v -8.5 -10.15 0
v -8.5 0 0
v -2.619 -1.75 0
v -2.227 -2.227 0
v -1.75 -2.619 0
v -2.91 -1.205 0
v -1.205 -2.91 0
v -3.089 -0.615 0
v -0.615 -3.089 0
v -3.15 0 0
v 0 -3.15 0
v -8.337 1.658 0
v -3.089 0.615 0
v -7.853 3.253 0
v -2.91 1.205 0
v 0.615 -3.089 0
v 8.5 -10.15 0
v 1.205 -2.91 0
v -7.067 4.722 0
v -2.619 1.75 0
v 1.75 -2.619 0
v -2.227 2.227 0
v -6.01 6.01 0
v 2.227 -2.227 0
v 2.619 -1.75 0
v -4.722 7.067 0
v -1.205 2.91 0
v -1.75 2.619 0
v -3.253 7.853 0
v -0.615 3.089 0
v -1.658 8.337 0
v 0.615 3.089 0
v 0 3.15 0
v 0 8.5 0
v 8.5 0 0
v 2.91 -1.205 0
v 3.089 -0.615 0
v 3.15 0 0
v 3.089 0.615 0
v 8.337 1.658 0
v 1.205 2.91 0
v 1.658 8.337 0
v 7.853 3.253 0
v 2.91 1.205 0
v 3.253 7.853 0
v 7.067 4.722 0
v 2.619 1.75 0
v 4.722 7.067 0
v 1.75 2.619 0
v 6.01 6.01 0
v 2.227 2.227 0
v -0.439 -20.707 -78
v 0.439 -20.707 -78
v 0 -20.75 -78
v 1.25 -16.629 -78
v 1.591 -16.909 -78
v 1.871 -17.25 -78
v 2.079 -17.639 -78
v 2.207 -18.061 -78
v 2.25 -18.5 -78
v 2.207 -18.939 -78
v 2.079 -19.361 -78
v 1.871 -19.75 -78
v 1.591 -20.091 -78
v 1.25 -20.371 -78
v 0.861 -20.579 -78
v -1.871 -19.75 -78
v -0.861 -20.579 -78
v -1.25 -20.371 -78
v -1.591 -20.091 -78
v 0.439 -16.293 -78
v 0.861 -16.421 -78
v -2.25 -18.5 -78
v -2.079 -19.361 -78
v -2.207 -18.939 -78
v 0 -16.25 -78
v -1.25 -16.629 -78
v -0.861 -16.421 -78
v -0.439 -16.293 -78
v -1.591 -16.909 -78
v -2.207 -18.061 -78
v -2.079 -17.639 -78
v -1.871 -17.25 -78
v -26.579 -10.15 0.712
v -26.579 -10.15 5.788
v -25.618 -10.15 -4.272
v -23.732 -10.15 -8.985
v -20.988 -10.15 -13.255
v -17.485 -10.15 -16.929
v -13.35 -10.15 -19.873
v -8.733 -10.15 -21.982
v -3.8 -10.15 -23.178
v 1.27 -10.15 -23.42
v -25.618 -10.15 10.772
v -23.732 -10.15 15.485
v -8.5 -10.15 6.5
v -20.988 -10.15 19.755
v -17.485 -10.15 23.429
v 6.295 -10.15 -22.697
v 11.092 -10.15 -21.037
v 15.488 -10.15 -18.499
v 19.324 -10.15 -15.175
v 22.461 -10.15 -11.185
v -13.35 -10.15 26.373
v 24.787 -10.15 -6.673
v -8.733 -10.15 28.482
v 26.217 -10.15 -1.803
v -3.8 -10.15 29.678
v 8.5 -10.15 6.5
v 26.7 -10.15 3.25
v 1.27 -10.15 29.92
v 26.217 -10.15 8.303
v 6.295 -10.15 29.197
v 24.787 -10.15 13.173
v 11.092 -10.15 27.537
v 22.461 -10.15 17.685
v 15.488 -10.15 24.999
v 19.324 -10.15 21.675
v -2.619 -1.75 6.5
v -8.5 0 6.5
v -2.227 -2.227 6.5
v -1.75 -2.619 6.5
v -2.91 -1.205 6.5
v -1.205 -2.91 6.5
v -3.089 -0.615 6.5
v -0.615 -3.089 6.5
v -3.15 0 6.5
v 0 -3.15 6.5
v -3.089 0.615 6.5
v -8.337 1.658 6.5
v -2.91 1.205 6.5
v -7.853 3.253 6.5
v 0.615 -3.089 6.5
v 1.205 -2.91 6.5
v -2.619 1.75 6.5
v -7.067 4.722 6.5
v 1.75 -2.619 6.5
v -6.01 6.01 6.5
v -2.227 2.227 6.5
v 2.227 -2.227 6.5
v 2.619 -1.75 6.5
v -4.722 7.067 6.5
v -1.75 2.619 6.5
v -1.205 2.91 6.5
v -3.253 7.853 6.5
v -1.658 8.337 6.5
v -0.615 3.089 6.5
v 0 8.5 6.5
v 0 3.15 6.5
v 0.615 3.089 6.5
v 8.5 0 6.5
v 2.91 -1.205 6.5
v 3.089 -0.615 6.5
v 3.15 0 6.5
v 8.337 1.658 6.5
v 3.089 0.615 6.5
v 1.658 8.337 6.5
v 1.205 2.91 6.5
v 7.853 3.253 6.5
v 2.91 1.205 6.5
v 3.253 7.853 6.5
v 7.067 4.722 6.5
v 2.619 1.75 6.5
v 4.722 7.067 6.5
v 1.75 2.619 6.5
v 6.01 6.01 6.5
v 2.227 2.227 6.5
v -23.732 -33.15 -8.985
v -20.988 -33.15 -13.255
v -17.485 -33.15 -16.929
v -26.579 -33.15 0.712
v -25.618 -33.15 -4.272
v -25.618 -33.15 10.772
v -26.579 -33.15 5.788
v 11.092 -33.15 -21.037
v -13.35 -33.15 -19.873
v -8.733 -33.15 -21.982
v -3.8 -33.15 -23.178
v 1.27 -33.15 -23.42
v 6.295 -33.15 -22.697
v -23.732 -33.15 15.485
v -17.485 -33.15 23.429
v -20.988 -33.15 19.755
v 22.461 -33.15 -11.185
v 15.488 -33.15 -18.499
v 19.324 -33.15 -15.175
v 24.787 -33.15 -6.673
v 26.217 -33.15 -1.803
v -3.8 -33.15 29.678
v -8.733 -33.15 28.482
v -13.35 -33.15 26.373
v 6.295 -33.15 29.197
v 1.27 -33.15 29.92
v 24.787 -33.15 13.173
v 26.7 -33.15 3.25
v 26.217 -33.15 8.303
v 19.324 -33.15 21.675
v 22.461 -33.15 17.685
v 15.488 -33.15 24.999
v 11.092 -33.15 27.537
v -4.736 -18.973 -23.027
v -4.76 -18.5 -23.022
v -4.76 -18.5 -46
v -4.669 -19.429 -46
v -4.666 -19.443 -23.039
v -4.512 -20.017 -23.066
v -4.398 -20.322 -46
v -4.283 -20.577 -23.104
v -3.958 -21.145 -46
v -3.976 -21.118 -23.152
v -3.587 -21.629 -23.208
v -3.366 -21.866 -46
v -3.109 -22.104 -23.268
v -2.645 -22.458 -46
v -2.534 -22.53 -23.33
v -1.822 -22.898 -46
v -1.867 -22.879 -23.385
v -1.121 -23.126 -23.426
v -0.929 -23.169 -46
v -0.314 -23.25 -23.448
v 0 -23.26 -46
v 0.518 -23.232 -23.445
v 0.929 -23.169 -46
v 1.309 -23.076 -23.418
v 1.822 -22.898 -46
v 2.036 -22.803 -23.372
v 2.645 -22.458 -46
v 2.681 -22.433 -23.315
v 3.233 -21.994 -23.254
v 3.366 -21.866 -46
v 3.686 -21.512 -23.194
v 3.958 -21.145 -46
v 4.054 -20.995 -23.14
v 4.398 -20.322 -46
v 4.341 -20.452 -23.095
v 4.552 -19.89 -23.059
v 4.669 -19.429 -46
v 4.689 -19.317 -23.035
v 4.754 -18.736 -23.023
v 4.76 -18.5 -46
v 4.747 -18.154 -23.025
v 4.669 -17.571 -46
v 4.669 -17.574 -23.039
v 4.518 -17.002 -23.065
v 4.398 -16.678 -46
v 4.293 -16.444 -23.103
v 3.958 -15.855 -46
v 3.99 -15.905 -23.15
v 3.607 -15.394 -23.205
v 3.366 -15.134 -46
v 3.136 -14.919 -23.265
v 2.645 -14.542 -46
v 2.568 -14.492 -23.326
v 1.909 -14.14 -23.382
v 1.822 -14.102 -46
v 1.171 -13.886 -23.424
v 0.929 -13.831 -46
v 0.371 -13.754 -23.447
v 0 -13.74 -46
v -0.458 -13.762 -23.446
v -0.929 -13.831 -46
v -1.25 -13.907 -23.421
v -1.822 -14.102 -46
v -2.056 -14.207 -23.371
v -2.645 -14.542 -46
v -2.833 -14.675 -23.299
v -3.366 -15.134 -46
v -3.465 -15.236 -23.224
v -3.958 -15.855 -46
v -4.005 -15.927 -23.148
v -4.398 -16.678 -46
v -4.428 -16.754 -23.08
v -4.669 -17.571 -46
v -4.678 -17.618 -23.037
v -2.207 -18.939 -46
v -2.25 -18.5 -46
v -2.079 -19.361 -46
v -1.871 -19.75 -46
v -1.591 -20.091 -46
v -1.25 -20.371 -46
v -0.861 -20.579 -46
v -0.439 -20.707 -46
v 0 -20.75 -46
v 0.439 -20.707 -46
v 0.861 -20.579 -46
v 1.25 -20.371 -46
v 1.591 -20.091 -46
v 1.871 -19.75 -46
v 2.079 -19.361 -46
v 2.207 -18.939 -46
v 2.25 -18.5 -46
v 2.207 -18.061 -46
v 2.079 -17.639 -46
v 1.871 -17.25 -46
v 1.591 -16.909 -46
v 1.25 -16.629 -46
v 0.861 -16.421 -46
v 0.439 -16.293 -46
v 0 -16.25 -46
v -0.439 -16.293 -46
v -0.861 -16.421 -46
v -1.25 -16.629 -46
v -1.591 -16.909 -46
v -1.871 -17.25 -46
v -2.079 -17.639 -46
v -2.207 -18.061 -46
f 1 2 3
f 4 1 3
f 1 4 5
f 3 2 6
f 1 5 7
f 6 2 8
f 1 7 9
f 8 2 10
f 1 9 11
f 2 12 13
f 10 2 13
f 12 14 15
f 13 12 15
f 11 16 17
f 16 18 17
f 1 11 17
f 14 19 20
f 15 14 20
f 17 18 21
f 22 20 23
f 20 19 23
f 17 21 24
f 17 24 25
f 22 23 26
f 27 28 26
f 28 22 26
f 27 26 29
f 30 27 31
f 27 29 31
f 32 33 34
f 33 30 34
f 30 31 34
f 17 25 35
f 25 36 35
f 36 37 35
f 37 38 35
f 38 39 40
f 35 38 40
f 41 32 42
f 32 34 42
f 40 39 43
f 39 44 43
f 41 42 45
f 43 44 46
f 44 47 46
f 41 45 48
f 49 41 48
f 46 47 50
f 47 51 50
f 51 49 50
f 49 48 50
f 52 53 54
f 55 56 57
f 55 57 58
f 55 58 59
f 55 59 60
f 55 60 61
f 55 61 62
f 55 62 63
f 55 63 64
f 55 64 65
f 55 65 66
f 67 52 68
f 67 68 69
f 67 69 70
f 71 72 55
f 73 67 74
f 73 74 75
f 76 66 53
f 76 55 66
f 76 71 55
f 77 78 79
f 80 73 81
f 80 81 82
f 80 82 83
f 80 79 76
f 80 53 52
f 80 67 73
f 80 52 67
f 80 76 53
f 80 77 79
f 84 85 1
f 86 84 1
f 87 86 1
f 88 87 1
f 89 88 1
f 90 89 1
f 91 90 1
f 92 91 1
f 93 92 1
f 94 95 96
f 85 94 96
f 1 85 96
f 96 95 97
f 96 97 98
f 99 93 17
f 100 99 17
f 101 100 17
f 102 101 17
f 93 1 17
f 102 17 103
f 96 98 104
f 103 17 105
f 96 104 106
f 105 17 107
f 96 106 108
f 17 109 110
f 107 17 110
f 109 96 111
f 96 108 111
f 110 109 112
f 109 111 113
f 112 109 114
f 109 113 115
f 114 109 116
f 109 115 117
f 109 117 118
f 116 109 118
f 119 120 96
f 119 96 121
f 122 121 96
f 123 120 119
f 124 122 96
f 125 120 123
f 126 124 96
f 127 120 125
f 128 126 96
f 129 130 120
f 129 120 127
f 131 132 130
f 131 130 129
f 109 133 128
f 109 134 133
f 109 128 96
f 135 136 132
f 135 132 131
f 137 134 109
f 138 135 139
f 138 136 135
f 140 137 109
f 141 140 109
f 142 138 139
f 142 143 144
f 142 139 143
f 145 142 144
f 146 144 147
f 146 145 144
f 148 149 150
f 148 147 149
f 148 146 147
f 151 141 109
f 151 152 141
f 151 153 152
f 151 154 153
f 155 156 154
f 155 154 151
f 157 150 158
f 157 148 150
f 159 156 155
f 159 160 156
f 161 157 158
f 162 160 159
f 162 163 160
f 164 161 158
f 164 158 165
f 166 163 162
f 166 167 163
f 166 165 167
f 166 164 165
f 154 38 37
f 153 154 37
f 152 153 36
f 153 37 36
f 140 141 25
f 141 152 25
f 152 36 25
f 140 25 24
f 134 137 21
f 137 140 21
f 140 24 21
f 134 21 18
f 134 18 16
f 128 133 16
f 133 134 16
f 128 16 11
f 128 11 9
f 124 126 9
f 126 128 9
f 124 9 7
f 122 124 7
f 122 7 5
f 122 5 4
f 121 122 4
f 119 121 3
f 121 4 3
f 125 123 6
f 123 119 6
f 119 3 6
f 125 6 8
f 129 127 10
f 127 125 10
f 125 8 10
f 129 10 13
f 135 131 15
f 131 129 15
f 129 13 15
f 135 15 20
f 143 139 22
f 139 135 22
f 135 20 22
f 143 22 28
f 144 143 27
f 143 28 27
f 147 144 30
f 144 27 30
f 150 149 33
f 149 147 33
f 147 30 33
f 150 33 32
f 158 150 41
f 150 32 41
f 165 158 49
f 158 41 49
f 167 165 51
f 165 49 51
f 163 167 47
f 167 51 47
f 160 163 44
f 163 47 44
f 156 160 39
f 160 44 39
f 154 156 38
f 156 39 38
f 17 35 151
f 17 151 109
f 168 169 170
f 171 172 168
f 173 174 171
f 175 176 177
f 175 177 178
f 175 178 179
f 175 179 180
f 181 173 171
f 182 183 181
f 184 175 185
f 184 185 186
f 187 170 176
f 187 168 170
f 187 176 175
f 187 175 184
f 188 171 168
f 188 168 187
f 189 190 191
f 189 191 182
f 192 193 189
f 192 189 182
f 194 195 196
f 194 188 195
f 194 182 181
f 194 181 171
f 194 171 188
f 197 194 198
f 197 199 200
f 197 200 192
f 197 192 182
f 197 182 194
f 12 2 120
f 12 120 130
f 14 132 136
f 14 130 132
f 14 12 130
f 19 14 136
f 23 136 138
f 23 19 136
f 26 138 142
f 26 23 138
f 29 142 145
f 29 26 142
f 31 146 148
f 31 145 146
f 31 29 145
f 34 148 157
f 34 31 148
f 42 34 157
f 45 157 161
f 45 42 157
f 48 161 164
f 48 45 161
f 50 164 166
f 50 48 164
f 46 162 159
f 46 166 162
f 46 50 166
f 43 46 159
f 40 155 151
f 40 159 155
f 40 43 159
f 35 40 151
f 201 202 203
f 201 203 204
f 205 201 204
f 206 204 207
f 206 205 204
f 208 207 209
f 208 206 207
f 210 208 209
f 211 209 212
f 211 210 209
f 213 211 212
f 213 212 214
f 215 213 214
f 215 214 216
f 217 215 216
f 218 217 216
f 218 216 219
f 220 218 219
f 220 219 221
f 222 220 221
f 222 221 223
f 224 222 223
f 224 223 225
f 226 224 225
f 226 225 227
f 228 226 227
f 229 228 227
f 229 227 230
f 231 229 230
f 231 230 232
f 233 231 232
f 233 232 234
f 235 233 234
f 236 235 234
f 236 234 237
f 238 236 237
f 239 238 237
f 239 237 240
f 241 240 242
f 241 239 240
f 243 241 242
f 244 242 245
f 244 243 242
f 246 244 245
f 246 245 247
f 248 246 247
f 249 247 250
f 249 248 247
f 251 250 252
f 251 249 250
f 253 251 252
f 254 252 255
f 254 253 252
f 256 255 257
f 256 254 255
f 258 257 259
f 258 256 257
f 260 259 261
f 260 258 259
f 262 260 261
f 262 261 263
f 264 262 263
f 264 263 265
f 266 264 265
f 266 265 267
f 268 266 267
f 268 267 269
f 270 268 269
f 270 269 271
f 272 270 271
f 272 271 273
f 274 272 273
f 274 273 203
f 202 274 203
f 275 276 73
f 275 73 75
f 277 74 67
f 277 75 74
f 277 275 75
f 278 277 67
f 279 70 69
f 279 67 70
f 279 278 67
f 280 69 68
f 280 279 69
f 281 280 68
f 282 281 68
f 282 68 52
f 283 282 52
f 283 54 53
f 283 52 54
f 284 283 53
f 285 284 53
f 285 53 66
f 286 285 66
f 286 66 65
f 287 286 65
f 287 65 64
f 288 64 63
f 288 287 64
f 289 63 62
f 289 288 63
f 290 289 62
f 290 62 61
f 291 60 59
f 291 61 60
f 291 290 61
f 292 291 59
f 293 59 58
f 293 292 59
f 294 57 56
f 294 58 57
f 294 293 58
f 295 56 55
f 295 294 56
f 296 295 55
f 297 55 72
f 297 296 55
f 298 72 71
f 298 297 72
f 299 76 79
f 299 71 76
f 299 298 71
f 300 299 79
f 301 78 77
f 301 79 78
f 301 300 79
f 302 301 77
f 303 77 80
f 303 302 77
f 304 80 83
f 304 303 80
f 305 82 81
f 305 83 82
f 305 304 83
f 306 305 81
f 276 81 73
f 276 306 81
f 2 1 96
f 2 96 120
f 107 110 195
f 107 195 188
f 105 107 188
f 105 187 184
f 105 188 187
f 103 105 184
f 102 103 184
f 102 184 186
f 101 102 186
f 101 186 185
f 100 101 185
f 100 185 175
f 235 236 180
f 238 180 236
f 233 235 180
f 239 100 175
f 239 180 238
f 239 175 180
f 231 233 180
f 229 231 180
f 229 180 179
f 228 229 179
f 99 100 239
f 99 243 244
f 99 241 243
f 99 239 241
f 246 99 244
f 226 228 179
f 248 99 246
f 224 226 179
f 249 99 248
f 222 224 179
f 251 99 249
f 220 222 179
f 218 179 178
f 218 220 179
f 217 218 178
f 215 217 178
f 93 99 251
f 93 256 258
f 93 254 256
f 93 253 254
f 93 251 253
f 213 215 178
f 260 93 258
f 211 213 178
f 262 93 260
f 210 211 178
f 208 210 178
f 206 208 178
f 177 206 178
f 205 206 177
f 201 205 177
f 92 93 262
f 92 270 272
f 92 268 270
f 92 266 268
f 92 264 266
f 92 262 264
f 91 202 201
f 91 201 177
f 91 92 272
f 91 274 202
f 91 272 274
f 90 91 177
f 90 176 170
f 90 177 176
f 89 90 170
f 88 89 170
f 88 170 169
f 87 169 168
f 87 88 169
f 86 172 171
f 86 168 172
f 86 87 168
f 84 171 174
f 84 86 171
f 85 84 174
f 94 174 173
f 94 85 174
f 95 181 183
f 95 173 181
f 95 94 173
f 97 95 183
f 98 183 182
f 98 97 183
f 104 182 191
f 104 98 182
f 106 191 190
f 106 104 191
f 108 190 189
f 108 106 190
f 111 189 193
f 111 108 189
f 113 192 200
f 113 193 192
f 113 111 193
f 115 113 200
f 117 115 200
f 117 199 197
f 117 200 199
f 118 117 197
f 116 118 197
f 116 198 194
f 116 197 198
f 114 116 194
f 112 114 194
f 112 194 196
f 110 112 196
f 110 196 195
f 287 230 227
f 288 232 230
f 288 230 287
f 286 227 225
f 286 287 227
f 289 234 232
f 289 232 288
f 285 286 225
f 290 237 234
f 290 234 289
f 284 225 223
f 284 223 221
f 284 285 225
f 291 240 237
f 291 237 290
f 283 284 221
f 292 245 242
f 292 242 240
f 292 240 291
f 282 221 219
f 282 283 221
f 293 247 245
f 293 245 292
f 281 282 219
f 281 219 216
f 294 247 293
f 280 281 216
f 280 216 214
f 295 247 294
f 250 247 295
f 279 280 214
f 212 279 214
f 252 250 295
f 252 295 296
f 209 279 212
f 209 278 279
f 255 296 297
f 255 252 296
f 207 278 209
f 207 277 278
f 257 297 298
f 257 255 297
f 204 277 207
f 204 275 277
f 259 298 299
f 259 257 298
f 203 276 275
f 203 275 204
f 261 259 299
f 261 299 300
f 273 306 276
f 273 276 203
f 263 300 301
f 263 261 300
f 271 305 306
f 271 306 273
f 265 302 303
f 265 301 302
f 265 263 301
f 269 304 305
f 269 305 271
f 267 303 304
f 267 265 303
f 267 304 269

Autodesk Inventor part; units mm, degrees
ref_plane "XZ Plane" through (0, 0, 0) normal (0, 1, 0) x (-1, 0, 0)
ref_plane "XY Plane" through (0, 0, 0) normal (0, 0, 1) x (1, 0, 0)
sketch "Sketch2" plane through (0, 0, 0) normal (0, 0, 1) x (1, 0, 0)
  circle A0 centre (0, 0) radius 3.15
  line L0 (-8.5, -10.15) -> (-8.5, 0)
  line L1 (8.5, 0) -> (8.5, -10.15)
  line L2 (-8.5, -10.15) -> (8.5, -10.15)
  arc A1 (8.5, 0) -> (-8.5, 0) centre (0, 0) ccw
  line L3 (0, 8.5) -> (8.5, 8.5) construction
  dimension "d0" = 6.3
  dimension "d1" = 17
  dimension "d2" = 18.65
extrude "Extrusion1" add sketch "Sketch2" along normal blind 6.5
sketch "Sketch3" plane through (-8.5, -10.15, 0) normal (0, -1, 0) x (1, 0, 0)
  line L0 (0, 6.5) -> (17, 6.5) projected
  line L1 (0, 0) -> (0, 6.5) projected
  circle A0 centre (8.5, 3.25) radius 26.7
  point P0 (8.5, 0)
  point P1 (0, 3.25)
  point P2 (0, 3.25)
  point P3 (8.5, 6.5)
  dimension "d5" = 53.4
extrude "Extrusion2" add sketch "Sketch3" along normal blind 23
sketch "Sketch4" plane through (0, 0, 0) normal (0, 0, -1) x (-1, 0, 0)
  circle A0 centre (0, 0) radius 3.15 projected
  circle A1 centre (0, 0) radius 3.15 projected
  arc A2 (8.5, 0) -> (-8.5, 0) centre (0, 0) ccw projected
  line L0 (8.5, 0) -> (8.5, -10.15) projected
  line L1 (8.5, -10.15) -> (26.5015, -10.15) projected
  line L2 (26.5015, -10.15) -> (26.5015, -33.15) projected
  line L3 (26.5015, -33.15) -> (-26.5015, -33.15) projected
  line L4 (-26.5015, -33.15) -> (-26.5015, -10.15) projected
  line L5 (-26.5015, -10.15) -> (-8.5, -10.15) projected
  line L6 (-8.5, -10.15) -> (8.5, -10.15) projected
  line L7 (-8.5, -10.15) -> (-8.5, 0) projected
  circle A3 centre (0, -18.5) radius 4.76
  dimension "d8" = 9.52
  dimension "d9" = 8.35
extrude "Extrusion3" add sketch "Sketch4" along normal blind 46 contours A3
sketch "Sketch5" plane through (0, -18.5, -46) normal (0, 0, -1) x (-1, 0, 0)
  circle A0 centre (0, 0) radius 4.76 projected
  circle A1 centre (0, 0) radius 2.25
  point P0 (0, 18.5)
  dimension "d12" = 4.5
extrude "Extrusion4" add sketch "Sketch5" along normal blind 32 contours A1
ref_plane "Work Plane1" through (0, 0, 0) normal (1, 0, 0) x (0, 1, 0)
properties part number "dial-indicator"
